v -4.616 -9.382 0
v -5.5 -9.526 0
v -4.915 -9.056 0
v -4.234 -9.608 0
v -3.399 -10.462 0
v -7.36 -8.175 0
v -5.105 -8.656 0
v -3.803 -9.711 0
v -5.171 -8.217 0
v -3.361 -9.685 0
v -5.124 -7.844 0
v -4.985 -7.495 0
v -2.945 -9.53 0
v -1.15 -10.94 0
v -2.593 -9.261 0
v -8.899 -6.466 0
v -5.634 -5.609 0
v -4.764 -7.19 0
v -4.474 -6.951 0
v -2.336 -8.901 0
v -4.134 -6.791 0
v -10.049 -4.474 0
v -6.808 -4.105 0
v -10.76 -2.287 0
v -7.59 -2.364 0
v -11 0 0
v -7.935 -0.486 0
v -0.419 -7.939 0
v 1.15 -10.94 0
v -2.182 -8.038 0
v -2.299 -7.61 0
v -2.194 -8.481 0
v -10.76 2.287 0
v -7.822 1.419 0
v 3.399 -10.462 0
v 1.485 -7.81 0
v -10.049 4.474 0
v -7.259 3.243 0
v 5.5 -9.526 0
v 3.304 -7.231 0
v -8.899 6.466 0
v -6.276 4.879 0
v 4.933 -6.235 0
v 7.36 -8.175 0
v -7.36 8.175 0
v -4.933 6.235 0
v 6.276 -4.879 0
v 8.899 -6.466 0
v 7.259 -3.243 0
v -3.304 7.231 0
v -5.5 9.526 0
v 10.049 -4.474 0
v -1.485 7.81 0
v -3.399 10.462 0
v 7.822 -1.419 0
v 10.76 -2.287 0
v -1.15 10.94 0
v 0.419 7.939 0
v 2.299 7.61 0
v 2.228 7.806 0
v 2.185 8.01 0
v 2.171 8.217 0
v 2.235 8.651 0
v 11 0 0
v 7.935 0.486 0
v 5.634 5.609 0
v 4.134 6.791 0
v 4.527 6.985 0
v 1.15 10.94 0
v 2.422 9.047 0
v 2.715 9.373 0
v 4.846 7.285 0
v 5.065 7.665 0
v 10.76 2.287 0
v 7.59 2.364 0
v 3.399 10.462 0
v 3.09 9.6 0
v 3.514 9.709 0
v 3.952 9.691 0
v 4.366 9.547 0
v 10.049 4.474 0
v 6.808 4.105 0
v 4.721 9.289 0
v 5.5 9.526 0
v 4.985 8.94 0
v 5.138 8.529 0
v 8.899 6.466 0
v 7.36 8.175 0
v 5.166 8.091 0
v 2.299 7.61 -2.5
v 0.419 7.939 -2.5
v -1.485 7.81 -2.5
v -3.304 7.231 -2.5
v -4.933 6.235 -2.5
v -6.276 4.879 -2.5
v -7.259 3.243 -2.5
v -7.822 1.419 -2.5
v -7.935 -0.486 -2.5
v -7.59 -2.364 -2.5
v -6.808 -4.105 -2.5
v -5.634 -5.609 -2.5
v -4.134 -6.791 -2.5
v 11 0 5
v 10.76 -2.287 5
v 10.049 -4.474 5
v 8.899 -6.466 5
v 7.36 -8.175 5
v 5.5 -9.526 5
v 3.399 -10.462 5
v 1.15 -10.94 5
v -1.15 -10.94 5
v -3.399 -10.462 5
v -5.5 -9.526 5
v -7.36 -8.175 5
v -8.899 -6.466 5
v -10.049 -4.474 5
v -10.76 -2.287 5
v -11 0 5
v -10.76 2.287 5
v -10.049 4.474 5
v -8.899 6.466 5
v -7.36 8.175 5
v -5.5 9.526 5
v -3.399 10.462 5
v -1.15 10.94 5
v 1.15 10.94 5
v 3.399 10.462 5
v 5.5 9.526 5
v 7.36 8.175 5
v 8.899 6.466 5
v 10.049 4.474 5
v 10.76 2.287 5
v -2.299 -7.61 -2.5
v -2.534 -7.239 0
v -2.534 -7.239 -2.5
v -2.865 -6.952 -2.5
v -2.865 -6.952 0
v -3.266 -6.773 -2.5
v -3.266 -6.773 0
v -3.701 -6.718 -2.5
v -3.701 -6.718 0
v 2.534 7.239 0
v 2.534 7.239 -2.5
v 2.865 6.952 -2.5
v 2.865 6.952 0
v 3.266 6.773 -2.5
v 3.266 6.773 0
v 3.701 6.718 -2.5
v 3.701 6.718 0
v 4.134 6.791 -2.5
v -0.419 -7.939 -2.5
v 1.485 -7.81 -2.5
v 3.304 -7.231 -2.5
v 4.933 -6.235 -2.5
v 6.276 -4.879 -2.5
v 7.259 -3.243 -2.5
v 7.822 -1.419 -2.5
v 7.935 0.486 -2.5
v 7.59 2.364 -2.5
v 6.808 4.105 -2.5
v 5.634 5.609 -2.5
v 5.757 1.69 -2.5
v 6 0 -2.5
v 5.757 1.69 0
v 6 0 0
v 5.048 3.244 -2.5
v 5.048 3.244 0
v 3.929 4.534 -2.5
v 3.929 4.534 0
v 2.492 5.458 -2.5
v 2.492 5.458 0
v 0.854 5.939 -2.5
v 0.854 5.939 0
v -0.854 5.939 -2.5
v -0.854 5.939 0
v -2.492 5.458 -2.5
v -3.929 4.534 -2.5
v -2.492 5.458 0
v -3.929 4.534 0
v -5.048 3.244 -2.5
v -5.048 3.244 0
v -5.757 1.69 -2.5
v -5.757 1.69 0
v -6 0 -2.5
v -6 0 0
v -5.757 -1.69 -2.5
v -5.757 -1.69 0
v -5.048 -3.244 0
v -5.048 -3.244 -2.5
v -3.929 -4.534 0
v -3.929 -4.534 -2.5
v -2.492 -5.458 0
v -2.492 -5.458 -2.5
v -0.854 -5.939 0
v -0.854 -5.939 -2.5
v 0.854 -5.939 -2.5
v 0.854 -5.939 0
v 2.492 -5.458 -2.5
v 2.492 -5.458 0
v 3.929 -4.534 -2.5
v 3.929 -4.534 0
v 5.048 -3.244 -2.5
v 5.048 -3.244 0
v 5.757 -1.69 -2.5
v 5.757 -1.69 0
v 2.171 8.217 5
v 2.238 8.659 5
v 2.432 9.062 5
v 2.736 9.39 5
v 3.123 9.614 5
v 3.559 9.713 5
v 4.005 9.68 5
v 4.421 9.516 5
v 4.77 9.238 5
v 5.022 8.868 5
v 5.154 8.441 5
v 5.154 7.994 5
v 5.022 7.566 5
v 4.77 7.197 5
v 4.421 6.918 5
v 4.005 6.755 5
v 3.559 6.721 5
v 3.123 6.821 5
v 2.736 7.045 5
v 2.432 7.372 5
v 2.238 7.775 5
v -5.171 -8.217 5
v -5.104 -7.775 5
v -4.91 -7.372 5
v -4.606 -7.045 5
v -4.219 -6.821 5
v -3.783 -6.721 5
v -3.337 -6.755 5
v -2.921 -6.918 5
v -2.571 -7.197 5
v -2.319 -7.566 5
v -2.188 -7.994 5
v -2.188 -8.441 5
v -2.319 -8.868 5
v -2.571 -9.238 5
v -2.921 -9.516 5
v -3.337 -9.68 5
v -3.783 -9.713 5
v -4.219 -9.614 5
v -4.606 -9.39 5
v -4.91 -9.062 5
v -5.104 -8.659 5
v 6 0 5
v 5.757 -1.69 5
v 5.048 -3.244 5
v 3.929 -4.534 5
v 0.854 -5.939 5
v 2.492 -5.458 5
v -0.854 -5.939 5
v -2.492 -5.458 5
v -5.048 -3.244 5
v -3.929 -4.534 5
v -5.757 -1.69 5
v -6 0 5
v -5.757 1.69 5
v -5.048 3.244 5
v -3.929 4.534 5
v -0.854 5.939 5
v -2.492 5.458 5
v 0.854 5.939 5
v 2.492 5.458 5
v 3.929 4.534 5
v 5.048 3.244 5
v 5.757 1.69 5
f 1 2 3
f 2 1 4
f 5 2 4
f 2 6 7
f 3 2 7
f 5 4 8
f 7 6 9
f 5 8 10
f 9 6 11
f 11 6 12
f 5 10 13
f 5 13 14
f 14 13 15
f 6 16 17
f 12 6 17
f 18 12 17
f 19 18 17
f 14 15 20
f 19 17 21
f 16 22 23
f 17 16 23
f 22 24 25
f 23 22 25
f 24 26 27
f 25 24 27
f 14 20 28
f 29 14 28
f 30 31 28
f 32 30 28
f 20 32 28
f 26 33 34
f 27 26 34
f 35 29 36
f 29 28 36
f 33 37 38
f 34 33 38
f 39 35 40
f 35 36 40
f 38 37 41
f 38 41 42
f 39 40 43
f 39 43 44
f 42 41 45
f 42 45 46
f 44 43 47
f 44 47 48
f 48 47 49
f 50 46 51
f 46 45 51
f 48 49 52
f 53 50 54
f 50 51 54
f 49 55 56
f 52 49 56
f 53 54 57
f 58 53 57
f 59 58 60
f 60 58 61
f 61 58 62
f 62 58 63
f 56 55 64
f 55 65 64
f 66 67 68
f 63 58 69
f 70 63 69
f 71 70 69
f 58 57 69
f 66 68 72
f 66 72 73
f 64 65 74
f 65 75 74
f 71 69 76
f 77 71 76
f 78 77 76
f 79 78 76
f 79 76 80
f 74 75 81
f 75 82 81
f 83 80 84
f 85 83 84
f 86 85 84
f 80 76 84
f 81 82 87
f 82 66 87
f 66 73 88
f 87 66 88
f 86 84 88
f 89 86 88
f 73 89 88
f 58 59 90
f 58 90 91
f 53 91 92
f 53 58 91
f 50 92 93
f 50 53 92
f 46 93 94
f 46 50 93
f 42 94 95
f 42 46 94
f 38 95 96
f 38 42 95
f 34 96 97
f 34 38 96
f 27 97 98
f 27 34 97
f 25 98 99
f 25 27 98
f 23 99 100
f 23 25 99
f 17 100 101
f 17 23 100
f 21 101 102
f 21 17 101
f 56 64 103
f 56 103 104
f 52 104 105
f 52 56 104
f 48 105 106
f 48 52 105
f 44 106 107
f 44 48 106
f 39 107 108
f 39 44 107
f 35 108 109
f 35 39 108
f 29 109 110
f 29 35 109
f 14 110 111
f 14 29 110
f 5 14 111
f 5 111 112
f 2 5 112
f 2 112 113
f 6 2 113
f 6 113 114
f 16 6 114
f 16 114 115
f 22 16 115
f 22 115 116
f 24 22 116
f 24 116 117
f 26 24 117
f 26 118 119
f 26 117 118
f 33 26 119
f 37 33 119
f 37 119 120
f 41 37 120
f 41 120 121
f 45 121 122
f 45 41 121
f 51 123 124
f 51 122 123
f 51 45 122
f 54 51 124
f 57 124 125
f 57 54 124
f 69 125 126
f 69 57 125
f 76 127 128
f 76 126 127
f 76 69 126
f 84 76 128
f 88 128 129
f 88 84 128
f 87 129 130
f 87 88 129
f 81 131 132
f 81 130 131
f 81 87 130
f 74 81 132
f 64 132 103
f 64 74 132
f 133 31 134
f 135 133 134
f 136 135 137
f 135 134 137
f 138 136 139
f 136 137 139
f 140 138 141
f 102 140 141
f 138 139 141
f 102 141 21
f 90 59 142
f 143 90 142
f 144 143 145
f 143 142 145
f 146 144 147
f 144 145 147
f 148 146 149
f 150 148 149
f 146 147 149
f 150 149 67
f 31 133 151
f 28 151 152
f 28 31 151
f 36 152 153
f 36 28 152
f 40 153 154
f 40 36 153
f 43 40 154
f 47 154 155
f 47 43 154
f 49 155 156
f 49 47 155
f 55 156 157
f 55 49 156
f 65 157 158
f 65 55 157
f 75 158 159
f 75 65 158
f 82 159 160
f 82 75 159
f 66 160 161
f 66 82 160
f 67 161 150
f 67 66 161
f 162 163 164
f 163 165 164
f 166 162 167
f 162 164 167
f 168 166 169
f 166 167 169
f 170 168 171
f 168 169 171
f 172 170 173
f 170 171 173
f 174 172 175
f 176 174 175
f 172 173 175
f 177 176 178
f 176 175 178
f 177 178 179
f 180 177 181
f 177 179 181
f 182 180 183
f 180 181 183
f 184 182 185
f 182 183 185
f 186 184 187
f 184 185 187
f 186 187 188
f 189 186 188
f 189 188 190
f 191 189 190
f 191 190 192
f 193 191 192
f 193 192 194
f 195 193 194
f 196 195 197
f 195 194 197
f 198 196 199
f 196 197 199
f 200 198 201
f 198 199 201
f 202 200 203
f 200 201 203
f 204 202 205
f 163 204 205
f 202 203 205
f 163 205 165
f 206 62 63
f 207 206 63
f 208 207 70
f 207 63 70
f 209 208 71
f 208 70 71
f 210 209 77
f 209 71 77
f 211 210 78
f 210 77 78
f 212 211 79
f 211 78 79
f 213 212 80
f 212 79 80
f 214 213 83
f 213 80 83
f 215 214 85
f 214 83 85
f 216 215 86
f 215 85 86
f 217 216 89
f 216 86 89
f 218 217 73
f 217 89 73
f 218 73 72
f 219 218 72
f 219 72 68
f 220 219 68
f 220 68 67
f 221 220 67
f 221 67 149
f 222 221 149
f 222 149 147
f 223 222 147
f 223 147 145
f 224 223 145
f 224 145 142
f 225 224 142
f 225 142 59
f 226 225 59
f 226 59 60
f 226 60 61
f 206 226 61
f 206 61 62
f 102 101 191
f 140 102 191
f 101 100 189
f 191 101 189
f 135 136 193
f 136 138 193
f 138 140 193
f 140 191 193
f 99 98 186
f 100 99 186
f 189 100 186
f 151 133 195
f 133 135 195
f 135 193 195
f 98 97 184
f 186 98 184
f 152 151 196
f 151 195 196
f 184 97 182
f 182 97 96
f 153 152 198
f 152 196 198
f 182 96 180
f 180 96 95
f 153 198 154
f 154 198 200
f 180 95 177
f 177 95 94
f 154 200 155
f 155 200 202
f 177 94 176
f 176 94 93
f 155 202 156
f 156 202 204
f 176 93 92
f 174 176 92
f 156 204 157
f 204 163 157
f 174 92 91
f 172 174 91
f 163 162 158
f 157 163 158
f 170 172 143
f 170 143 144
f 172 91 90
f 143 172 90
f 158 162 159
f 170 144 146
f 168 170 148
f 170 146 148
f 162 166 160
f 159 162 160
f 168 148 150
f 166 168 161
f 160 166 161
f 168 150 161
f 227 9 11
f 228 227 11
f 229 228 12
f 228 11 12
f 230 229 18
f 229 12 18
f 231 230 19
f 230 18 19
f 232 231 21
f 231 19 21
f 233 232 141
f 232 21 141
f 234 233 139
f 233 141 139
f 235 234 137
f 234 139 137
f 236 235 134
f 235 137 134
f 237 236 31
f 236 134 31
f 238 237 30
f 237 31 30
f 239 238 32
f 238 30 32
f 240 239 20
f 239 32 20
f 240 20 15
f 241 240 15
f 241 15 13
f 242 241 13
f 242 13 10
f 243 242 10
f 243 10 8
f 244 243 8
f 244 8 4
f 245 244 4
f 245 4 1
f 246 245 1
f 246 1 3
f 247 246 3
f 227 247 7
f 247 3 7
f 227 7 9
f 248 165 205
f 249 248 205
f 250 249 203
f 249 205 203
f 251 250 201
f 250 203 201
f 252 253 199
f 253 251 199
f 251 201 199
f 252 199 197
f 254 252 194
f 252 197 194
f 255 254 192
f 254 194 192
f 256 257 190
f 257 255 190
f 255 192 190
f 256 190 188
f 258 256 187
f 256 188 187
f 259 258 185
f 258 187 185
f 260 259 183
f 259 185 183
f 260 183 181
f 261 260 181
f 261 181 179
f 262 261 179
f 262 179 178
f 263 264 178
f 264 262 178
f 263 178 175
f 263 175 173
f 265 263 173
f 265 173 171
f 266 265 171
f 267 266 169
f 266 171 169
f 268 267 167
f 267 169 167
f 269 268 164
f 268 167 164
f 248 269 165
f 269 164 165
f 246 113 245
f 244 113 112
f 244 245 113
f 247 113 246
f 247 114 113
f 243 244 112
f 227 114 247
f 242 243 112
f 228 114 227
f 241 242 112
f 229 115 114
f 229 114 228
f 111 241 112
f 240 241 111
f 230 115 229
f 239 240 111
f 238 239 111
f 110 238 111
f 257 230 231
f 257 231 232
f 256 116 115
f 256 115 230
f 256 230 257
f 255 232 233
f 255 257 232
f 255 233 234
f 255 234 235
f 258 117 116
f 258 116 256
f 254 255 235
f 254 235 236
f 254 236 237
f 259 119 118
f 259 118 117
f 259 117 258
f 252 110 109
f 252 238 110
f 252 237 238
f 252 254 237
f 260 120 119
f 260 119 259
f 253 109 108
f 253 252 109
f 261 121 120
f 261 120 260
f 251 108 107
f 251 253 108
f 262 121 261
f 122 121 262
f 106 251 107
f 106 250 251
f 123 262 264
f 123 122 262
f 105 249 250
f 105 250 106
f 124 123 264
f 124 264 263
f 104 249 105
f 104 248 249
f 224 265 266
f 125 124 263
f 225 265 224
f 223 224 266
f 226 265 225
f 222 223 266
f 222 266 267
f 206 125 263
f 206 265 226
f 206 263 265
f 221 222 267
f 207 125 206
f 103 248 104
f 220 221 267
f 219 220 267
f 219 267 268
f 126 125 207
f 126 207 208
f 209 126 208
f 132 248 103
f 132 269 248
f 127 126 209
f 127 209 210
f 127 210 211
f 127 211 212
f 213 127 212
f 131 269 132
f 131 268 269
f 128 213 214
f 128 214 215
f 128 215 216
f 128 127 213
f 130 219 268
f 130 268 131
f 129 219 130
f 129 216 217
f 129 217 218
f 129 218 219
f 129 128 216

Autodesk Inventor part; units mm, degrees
ref_plane "YZ Plane" through (0, 0, 0) normal (1, 0, 0) x (0, 1, 0)
ref_plane "XZ Plane" through (0, 0, 0) normal (0, 1, 0) x (-1, 0, 0)
ref_plane "XY Plane" through (0, 0, 0) normal (0, 0, 1) x (1, 0, 0)
sketch "Эскиз1" plane through (0, 0, 0) normal (0, 0, 1) x (1, 0, 0)
  circle A0 centre (0, 0) radius 7.95
  circle A1 centre (0, 0) radius 11
  circle A2 centre (0, 0) radius 6
  dimension "d0" = 15.9
  dimension "d1" = 22
  dimension "d2" = 12
extrude "Выдавливание1" add sketch "Эскиз1" against normal blind 2.5 contours A0
extrude "Выдавливание2" add sketch "Эскиз1" along normal blind 5 contours A0 | A1
sketch "Эскиз2" plane through (0, 0, 0) normal (0, 0, -1) x (-1, 0, 0)
  circle A0 centre (3.6709, -8.2173) radius 1.5 projected
  circle A1 centre (-3.6709, 8.2173) radius 1.5 projected
  circle A2 centre (3.6709, -8.2173) radius 1.5
  circle A3 centre (-3.6709, 8.2173) radius 1.5
  point P0 (0, 0)
  dimension "d7" = 3
  dimension "d8" = 3
extrude "Выдавливание3" cut sketch "Эскиз2" along normal mid plane 30
properties part number "MELLOW barrier adapter"
